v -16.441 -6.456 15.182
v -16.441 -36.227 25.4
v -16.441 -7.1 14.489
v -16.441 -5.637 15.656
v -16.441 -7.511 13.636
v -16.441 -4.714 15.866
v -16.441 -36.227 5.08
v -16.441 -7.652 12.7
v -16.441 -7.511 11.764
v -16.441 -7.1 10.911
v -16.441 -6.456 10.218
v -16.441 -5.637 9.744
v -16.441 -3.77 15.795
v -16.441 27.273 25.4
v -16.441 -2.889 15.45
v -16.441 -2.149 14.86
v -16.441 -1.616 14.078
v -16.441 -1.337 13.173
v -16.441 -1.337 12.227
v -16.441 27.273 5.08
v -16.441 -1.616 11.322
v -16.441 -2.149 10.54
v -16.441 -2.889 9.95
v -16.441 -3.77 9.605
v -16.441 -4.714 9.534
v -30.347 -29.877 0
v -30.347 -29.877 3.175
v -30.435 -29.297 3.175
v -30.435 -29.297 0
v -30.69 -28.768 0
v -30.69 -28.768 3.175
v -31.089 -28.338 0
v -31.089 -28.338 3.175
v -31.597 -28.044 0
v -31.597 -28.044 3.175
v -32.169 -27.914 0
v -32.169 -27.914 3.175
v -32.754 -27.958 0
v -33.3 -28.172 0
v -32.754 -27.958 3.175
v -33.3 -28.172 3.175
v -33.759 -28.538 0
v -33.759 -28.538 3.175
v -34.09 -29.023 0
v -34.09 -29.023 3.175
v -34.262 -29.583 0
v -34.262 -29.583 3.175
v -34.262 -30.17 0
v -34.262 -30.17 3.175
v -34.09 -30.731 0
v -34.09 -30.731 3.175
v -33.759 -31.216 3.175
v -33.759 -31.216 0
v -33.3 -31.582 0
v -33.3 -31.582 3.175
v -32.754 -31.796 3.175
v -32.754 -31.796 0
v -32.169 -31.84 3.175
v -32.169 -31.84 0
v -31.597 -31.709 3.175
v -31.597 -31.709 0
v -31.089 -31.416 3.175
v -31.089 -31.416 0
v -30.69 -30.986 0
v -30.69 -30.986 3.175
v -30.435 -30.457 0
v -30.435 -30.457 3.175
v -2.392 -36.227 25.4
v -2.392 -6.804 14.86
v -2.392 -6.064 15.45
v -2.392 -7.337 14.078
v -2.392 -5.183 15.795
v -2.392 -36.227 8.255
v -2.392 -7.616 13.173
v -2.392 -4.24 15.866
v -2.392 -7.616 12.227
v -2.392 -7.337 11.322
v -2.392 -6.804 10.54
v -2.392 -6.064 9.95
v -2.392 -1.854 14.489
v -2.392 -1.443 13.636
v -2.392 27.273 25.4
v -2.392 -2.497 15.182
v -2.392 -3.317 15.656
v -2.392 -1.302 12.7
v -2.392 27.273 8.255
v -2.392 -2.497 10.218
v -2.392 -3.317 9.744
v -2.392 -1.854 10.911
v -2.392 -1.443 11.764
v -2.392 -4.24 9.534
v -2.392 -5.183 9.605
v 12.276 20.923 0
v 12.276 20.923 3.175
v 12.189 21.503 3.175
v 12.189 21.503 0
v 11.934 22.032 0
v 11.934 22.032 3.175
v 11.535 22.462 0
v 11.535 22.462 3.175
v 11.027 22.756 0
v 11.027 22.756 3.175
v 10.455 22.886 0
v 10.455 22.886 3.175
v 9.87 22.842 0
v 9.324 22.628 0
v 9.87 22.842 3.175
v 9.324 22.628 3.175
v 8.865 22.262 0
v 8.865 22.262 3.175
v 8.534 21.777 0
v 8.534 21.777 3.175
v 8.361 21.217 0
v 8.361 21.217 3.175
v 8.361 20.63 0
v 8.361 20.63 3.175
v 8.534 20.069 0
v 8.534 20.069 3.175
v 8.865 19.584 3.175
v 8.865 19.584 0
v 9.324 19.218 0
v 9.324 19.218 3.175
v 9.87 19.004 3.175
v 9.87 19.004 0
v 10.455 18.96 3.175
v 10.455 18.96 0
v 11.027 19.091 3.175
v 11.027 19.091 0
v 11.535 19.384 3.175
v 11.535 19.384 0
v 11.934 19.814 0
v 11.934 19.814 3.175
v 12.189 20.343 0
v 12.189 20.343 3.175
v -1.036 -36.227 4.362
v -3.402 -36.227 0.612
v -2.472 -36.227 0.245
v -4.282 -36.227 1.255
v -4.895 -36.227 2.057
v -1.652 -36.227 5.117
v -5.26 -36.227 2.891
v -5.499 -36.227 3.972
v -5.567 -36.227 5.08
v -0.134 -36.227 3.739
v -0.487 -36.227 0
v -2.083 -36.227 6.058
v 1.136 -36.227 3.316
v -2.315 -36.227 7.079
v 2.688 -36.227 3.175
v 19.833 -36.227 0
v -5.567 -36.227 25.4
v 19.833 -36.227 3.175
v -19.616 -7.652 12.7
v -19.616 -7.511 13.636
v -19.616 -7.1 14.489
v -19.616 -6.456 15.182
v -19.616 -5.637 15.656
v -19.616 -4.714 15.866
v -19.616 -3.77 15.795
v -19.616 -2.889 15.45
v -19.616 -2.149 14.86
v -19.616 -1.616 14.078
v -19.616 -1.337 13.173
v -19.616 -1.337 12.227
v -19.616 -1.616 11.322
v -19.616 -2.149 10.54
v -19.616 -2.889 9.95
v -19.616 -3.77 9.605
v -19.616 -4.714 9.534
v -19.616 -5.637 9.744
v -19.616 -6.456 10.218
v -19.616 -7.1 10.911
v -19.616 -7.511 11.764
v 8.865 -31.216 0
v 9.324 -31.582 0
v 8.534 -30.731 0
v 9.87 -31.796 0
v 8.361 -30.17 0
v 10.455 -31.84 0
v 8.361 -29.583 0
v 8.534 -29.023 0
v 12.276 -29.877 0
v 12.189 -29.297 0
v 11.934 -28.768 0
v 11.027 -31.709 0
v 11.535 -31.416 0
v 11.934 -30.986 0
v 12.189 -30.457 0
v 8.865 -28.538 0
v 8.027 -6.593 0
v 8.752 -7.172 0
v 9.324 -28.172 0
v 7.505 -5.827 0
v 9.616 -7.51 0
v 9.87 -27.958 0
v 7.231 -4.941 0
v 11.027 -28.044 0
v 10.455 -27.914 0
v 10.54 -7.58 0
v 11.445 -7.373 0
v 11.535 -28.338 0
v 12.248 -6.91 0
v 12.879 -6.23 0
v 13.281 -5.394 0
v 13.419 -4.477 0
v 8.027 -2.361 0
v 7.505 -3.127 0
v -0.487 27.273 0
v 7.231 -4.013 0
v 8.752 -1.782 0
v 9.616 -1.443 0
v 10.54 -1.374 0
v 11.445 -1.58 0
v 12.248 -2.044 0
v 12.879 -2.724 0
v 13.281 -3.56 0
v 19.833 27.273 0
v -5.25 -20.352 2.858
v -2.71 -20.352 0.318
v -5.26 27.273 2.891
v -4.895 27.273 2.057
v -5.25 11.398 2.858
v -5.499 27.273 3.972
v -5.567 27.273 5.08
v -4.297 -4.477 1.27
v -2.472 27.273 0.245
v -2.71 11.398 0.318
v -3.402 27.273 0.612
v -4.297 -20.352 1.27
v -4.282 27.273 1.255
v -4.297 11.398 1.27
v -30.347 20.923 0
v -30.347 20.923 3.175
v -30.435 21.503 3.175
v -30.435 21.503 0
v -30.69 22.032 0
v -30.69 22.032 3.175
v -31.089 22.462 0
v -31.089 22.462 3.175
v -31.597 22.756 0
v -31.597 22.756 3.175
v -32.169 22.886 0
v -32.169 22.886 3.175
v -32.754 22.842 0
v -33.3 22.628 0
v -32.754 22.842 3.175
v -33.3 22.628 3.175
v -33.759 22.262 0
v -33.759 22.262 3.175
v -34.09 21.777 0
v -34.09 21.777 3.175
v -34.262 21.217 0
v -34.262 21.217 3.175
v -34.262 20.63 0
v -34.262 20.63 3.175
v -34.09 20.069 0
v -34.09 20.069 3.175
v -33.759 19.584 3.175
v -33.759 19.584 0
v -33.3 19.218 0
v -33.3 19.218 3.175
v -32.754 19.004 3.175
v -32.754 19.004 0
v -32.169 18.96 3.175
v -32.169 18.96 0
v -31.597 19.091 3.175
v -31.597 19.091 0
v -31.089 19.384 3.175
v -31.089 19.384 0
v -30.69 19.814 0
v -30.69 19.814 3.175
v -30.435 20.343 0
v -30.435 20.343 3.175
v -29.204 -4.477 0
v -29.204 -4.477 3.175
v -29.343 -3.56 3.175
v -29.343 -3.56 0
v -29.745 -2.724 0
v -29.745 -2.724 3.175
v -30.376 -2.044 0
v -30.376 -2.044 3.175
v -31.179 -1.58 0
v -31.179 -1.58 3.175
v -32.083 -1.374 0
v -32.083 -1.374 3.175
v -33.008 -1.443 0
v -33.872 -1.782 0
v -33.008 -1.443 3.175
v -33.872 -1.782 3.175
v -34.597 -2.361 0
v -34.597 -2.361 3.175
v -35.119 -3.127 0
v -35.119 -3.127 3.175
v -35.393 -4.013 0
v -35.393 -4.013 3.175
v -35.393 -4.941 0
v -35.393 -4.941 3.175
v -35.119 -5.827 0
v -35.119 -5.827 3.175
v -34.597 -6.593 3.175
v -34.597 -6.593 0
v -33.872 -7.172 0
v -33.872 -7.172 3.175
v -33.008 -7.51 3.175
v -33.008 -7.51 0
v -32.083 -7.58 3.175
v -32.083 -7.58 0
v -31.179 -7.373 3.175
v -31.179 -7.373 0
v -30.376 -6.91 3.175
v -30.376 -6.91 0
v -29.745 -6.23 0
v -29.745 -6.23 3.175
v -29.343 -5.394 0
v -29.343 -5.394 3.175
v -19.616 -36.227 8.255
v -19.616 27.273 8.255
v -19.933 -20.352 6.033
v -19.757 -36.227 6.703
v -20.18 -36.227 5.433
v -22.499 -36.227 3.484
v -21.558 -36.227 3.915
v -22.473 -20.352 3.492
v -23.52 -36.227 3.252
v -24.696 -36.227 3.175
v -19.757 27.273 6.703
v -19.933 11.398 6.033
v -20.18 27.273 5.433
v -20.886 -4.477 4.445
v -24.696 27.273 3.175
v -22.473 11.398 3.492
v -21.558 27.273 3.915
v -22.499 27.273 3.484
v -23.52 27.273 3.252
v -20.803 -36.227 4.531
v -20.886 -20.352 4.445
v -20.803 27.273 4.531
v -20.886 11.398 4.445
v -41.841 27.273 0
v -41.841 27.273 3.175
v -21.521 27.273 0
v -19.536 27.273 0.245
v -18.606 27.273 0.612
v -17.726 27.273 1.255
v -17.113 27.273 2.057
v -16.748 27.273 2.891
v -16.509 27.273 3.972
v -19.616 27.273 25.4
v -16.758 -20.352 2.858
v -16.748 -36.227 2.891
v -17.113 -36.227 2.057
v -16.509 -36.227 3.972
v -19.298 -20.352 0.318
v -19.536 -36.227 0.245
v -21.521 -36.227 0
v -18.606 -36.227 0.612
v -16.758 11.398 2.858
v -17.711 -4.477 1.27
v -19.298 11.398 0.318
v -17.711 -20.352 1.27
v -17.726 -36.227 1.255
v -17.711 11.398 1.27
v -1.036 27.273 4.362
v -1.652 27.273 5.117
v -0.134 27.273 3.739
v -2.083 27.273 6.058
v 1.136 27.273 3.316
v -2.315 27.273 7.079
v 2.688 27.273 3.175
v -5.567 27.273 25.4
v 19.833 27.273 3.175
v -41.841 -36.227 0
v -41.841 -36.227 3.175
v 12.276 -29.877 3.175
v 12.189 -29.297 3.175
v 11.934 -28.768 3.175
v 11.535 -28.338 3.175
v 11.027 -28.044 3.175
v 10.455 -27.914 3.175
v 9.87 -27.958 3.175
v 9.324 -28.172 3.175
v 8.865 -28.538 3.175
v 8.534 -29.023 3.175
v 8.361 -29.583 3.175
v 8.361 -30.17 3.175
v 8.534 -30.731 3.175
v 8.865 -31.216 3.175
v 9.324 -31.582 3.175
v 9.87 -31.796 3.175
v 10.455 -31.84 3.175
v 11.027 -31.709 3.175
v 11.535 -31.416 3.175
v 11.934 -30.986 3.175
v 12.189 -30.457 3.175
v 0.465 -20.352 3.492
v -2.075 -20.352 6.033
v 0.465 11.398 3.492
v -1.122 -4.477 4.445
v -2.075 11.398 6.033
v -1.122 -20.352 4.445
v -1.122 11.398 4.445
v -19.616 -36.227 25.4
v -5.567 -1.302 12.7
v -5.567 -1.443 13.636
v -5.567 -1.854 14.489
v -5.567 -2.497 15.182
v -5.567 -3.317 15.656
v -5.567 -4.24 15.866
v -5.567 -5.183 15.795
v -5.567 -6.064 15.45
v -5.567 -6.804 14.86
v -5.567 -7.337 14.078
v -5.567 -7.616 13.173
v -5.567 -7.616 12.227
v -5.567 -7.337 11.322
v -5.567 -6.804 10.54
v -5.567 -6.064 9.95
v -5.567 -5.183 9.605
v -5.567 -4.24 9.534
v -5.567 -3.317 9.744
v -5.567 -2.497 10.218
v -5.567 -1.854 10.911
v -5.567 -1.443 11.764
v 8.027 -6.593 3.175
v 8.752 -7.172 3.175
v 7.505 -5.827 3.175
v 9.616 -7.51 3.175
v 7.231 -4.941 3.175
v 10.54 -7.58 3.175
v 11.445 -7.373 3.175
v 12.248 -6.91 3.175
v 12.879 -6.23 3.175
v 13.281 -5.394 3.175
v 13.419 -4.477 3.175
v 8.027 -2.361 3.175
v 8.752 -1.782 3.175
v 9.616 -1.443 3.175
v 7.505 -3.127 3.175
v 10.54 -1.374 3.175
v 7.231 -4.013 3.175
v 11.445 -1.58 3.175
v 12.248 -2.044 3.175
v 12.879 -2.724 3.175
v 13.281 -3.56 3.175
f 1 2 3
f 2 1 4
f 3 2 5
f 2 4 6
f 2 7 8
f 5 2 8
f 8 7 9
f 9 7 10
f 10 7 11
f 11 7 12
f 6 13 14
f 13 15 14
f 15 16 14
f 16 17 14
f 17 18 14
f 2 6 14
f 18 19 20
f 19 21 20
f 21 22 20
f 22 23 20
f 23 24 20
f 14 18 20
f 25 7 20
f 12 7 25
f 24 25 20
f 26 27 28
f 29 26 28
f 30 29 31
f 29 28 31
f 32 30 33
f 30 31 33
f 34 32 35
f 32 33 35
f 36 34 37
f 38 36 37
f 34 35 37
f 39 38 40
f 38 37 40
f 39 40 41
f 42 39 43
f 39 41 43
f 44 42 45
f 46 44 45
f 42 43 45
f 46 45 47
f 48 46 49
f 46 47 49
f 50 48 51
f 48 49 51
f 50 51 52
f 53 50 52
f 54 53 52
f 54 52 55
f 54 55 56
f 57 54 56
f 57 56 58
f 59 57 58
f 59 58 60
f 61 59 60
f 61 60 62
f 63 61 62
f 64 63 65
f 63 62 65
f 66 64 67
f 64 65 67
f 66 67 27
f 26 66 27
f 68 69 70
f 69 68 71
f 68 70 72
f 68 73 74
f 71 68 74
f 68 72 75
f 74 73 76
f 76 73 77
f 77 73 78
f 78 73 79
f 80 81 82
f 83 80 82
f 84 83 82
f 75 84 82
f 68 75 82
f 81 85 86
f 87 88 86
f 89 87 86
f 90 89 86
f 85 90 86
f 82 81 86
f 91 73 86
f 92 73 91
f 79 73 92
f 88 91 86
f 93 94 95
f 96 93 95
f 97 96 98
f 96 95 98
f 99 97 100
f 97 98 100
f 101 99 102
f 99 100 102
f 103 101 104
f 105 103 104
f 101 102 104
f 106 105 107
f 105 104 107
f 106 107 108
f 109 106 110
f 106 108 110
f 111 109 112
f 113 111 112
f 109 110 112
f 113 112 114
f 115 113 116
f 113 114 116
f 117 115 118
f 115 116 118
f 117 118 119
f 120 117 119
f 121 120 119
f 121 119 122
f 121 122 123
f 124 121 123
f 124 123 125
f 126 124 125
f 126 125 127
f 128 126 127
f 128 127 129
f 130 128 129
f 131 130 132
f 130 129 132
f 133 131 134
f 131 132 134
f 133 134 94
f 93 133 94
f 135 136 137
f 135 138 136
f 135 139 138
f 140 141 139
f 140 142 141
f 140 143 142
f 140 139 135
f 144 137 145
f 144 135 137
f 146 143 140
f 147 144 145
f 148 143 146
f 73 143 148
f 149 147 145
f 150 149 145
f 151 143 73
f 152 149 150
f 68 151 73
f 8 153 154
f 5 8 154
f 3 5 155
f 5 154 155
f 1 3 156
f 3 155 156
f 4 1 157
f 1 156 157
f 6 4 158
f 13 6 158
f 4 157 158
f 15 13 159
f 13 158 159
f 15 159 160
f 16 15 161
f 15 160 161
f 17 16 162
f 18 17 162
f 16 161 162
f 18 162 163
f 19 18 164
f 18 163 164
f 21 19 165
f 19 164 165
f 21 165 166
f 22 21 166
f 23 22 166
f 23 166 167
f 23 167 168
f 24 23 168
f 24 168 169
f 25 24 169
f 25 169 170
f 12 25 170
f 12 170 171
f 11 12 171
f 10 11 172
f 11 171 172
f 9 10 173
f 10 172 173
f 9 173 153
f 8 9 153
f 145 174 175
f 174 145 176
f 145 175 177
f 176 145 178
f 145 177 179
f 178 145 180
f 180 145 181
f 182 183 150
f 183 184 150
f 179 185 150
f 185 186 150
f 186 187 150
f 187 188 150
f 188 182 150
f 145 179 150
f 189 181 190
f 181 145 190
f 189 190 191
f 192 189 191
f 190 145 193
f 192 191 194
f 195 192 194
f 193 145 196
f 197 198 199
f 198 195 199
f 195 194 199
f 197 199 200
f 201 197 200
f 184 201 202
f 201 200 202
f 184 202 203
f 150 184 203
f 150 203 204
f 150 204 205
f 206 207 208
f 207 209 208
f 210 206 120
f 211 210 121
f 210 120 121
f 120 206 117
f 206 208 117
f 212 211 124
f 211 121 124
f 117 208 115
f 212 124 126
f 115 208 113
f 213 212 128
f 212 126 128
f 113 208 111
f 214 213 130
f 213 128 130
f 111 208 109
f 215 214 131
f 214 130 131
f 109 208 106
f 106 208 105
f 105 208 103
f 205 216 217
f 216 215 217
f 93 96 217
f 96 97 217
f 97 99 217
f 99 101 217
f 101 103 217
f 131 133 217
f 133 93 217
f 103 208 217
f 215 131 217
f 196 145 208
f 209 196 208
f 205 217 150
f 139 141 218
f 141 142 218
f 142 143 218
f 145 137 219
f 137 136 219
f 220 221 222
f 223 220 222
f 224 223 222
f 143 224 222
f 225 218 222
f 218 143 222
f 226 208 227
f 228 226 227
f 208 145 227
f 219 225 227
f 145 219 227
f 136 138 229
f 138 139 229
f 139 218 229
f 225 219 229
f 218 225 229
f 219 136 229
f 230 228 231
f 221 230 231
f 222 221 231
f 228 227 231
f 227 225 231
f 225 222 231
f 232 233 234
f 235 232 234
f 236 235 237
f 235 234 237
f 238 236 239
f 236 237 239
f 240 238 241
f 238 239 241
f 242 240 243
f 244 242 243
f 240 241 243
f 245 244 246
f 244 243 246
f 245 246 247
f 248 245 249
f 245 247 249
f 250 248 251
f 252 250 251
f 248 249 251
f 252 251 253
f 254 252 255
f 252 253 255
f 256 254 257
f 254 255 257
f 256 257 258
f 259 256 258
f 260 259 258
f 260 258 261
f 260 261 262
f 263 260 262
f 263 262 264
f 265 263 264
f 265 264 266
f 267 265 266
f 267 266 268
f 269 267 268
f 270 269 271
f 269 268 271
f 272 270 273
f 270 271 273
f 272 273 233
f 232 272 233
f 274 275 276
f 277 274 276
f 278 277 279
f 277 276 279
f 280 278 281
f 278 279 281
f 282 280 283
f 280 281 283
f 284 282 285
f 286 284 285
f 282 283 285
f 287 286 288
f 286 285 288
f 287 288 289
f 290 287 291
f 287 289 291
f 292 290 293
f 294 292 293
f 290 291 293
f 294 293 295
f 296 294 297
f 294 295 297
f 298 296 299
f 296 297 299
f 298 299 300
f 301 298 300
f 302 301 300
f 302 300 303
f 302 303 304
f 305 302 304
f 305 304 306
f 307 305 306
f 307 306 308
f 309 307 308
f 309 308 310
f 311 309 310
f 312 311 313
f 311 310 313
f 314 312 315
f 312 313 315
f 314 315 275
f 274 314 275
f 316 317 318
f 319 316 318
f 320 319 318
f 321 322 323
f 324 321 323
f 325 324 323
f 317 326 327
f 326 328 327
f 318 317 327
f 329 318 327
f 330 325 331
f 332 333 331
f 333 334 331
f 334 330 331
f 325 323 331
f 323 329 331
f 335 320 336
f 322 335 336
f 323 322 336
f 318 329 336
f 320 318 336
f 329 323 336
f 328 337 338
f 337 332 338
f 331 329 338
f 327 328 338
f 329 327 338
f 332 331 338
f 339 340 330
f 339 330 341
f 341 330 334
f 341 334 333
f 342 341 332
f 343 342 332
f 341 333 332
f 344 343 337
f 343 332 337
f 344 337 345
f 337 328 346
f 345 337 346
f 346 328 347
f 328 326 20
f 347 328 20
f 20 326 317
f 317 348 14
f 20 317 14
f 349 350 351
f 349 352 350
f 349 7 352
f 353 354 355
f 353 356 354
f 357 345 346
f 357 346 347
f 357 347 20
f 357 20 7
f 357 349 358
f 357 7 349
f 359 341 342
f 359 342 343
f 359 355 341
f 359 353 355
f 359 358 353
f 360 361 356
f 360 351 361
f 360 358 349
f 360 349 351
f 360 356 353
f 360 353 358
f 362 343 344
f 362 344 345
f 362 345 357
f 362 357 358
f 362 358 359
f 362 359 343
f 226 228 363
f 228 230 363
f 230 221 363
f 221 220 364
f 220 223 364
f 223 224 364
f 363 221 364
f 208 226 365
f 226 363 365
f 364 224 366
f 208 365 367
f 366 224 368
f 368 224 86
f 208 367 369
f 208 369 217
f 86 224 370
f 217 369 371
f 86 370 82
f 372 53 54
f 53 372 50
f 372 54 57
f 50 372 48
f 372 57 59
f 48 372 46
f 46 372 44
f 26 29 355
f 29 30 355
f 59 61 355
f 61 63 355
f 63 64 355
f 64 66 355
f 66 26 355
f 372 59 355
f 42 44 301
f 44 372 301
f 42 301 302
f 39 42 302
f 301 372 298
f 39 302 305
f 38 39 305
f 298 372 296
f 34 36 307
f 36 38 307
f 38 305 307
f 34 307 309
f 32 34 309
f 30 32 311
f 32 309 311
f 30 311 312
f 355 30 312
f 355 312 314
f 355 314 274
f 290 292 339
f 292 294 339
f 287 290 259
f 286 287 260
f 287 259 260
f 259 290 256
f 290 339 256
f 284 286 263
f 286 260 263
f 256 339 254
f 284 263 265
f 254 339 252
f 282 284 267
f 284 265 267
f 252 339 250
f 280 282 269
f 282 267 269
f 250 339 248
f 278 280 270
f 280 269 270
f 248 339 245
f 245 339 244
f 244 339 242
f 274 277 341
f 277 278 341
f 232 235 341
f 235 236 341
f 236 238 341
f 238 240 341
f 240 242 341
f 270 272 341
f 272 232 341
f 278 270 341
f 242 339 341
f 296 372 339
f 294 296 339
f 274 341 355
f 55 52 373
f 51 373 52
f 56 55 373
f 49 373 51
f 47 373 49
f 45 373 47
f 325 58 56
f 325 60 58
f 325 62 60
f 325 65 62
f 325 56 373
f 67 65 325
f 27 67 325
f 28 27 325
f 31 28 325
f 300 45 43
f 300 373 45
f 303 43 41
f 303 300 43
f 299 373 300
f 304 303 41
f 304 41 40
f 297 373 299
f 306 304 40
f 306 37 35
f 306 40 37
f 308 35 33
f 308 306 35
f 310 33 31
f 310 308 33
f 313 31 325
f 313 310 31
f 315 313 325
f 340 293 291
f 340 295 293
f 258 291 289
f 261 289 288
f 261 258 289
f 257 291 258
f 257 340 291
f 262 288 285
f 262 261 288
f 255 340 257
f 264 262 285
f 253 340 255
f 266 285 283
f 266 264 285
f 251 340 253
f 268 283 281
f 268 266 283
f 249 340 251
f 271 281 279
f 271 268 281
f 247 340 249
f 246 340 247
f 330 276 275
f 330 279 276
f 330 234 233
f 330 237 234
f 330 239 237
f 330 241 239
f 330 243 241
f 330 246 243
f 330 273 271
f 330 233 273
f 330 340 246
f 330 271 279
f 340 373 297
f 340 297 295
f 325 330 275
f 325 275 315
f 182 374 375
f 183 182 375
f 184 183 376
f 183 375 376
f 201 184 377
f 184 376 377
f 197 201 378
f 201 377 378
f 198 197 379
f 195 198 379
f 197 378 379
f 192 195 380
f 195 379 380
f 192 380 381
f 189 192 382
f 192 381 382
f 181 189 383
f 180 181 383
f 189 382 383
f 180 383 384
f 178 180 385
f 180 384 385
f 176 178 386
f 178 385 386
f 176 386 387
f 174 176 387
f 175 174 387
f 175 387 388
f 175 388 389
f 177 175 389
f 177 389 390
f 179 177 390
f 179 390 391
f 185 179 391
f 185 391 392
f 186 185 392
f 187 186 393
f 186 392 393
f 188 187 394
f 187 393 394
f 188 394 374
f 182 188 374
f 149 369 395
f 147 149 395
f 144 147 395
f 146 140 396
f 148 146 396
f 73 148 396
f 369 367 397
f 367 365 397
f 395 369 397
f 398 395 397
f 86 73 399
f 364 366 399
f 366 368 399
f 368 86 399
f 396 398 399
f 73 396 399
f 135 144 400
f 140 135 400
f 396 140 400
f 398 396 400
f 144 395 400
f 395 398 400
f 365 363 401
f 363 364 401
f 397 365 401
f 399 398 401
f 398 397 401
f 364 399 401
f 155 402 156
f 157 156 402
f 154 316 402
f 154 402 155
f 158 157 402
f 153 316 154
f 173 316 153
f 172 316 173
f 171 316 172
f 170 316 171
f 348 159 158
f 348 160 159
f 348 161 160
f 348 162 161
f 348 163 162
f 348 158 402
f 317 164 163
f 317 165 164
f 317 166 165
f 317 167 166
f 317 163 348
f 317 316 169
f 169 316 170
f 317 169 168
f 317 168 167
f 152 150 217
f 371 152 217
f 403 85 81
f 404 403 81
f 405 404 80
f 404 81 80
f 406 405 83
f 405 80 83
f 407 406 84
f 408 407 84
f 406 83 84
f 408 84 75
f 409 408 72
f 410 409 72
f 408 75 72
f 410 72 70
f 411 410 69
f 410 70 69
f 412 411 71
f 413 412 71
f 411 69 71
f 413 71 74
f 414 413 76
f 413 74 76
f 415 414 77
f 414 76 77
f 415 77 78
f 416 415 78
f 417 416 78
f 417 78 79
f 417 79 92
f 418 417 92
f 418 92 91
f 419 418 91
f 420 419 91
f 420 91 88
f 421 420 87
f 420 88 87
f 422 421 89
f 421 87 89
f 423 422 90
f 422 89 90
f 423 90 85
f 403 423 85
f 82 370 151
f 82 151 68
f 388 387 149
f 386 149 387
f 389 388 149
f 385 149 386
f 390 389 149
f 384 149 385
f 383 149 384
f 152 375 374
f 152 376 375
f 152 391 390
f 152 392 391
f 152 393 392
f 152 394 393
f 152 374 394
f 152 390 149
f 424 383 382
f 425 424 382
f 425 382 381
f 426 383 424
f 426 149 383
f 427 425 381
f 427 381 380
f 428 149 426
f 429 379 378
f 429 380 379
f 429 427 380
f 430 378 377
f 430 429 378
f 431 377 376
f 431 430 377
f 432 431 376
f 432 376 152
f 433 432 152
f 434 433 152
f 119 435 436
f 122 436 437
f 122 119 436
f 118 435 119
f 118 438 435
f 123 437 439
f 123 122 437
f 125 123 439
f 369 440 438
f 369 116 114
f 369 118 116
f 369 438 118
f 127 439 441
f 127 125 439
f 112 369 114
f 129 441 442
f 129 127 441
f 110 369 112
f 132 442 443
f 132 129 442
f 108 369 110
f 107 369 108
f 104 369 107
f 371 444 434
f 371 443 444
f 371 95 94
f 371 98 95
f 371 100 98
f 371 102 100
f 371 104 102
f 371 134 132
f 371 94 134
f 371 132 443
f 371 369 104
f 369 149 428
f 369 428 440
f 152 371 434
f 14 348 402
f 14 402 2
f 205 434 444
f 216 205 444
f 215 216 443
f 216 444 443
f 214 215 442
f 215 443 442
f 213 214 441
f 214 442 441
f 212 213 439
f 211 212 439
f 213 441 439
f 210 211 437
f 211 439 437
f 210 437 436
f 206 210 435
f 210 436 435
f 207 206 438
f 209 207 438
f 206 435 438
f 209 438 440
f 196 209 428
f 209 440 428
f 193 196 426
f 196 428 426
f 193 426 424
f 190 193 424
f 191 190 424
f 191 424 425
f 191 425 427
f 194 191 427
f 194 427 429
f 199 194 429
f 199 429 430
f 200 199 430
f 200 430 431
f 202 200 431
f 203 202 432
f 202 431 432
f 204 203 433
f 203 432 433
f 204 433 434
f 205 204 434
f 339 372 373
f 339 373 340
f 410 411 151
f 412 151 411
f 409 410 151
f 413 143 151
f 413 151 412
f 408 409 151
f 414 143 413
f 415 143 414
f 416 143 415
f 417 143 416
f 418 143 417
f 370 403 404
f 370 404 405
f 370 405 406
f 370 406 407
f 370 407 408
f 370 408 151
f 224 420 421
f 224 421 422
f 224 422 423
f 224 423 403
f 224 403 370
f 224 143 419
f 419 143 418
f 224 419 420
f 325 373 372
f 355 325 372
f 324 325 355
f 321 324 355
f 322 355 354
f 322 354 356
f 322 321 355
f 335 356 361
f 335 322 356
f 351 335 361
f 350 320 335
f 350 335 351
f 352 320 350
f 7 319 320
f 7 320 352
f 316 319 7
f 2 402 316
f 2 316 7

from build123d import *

# Parameters (mm, degrees)
F0_W           = 25.4
F0_H           = 63.5
F1_DEPTH       = 3.175
F2_W           = 3.175
F2_H           = 63.5
F3_DEPTH       = 22.225
F4_R           = 3.175
F5_DEPTH       = 3.175
F6_R           = 1.9685
F7_DEPTH       = 3.175
F8_R           = 1.9685
F9_DEPTH       = 3.175
F10_R          = 3.1115
F11_DEPTH      = 3.175
F12_W          = 25.4
F12_H          = 63.5
F13_DEPTH      = 3.175
F14_R          = 3.1115
F15_R          = 1.9685
F16_DEPTH      = 3.175
F17_W          = 3.175
F17_H          = 63.5
F18_DEPTH      = 22.225
F19_R          = 3.175
F20_DEPTH      = 3.175
F21_T1_DEPTH   = 63.5
F21_T3_DEPTH   = 88.9
F21_2_T1_DEPTH = 63.5
F21_2_T3_DEPTH = 88.9


# Not quite as in the source:
# - a fillet or chamfer that OpenCascade refuses, or shapes differently, is made with other operations: its cross-section is extruded or revolved along the edge and cut away or added


with BuildPart() as f1:
    # F0 (on Top) → F1 (new body)
    with BuildSketch(Plane.XY):
        with Locations((-29.1409659298, -4.4768862426)):
            Rectangle(F0_W, F0_H)
    extrude(amount=F1_DEPTH)

    # F2 (on face) → F3 (join)
    with BuildSketch(Plane.XY.offset(3.175)):
        with Locations((-18.0284659298, -4.4768862426)):
            Rectangle(F2_W, F2_H)
    extrude(amount=F3_DEPTH)

    # F4 (on face) → F5 (cut)
    with BuildSketch(Plane(origin=(-19.6159659298, 0, 0), x_dir=(0, -1, 0), z_dir=(-1, 0, 0))):
        with Locations((4.4768862426, 12.7)):
            Circle(F4_R)
    extrude(amount=-F5_DEPTH, mode=Mode.SUBTRACT)

    # F6 (on face) → F7 (cut)
    with BuildSketch(Plane.XY.offset(3.175)):
        with Locations((-32.3159659298, 20.9231137574)):
            Circle(F6_R)
    extrude(amount=-F7_DEPTH, mode=Mode.SUBTRACT)

    # F8 (on face) → F9 (cut)
    with BuildSketch(Plane.XY.offset(3.175)):
        with Locations((-32.3159659298, -29.8768862426)):
            Circle(F8_R)
    extrude(amount=-F9_DEPTH, mode=Mode.SUBTRACT)

    # F10 (on face) → F11 (cut)
    with BuildSketch(Plane.XY.offset(3.175)):
        with Locations((-32.3159659298, -4.4768862426)):
            Circle(F10_R)
    extrude(amount=-F11_DEPTH, mode=Mode.SUBTRACT)

    # F21: fillet of radius 5.08 on 2 edges, made by hand

    # F21_s2 → F21_t1 (join)
    with BuildSketch(Plane.XZ.offset(-27.2731137574)):
        with BuildLine():
            add(Edge.make_bspline(
                [(-19.6159659298, 8.255), (-19.6159659298, 3.175), (-24.6959659298, 3.175)],
                knots=[0, 0, 0, 1, 1, 1], degree=2, weights=[1, 1, 1]))
            Line((-24.6959659298, 3.175), (-19.6159659298, 3.175))
            Line((-19.6159659298, 3.175), (-19.6159659298, 8.255))
        make_face()
    extrude(amount=F21_T1_DEPTH)

    # F21_s4 → F21_t3 (cut)
    with BuildSketch(Plane.XZ.offset(-39.9731137574)):
        with BuildLine():
            add(Edge.make_bspline(
                [(-16.4409659298, 5.08), (-16.4409659298, 0), (-21.5209659298, 0)],
                knots=[0, 0, 0, 1, 1, 1], degree=2, weights=[1, 1, 1]))
            Line((-21.5209659298, 0), (-16.4409659298, 0))
            Line((-16.4409659298, 0), (-16.4409659298, 5.08))
        make_face()
    extrude(amount=F21_T3_DEPTH, mode=Mode.SUBTRACT)


with BuildPart() as f13:
    # F12 (on Top) → F13 (new body)
    with BuildSketch(Plane.XY):
        with Locations((7.1329429418, -4.4768862426)):
            Rectangle(F12_W, F12_H)
    extrude(amount=F13_DEPTH)

    # F14 (on face) + F15 (on face) → F16 (cut)
    with BuildSketch(Plane.XY.offset(3.175)):
        with Locations((10.3079429418, -4.4768862426)):
            Circle(F14_R)
    with BuildSketch(Plane.XY.offset(3.175)):
        with Locations((10.3079429418, 20.9231137574)):
            Circle(F15_R)
        with Locations((10.3079429418, -29.8768862426)):
            Circle(F15_R)
    extrude(amount=-F16_DEPTH, mode=Mode.SUBTRACT)

    # F17 (on face) → F18 (join)
    with BuildSketch(Plane.XY.offset(3.175)):
        with Locations((-3.9795570582, -4.4768862426)):
            Rectangle(F17_W, F17_H)
    extrude(amount=F18_DEPTH)

    # F19 (on face) → F20 (cut)
    with BuildSketch(Plane.YZ.offset(-2.3920570582)):
        with Locations((-4.4768862426, 12.7)):
            Circle(F19_R)
    extrude(amount=-F20_DEPTH, mode=Mode.SUBTRACT)

    # F21#2: fillet of radius 5.08 on 2 edges, made by hand

    # F21_2_s2 → F21_2_t1 (join)
    with BuildSketch(Plane.XZ.offset(-27.2731137574)):
        with BuildLine():
            add(Edge.make_bspline(
                [(2.6879429418, 3.175), (-2.3920570582, 3.175), (-2.3920570582, 8.255)],
                knots=[0, 0, 0, 1, 1, 1], degree=2, weights=[1, 1, 1]))
            Line((-2.3920570582, 8.255), (-2.3920570582, 3.175))
            Line((-2.3920570582, 3.175), (2.6879429418, 3.175))
        make_face()
    extrude(amount=F21_2_T1_DEPTH)

    # F21_2_s4 → F21_2_t3 (cut)
    with BuildSketch(Plane.XZ.offset(-39.9731137574)):
        with BuildLine():
            add(Edge.make_bspline(
                [(-5.5670570582, 5.08), (-5.5670570582, 0), (-0.4870570582, 0)],
                knots=[0, 0, 0, 1, 1, 1], degree=2, weights=[1, 1, 1]))
            Line((-0.4870570582, 0), (-5.5670570582, 0))
            Line((-5.5670570582, 0), (-5.5670570582, 5.08))
        make_face()
    extrude(amount=F21_2_T3_DEPTH, mode=Mode.SUBTRACT)


solid = Compound([f1.part, f13.part])
